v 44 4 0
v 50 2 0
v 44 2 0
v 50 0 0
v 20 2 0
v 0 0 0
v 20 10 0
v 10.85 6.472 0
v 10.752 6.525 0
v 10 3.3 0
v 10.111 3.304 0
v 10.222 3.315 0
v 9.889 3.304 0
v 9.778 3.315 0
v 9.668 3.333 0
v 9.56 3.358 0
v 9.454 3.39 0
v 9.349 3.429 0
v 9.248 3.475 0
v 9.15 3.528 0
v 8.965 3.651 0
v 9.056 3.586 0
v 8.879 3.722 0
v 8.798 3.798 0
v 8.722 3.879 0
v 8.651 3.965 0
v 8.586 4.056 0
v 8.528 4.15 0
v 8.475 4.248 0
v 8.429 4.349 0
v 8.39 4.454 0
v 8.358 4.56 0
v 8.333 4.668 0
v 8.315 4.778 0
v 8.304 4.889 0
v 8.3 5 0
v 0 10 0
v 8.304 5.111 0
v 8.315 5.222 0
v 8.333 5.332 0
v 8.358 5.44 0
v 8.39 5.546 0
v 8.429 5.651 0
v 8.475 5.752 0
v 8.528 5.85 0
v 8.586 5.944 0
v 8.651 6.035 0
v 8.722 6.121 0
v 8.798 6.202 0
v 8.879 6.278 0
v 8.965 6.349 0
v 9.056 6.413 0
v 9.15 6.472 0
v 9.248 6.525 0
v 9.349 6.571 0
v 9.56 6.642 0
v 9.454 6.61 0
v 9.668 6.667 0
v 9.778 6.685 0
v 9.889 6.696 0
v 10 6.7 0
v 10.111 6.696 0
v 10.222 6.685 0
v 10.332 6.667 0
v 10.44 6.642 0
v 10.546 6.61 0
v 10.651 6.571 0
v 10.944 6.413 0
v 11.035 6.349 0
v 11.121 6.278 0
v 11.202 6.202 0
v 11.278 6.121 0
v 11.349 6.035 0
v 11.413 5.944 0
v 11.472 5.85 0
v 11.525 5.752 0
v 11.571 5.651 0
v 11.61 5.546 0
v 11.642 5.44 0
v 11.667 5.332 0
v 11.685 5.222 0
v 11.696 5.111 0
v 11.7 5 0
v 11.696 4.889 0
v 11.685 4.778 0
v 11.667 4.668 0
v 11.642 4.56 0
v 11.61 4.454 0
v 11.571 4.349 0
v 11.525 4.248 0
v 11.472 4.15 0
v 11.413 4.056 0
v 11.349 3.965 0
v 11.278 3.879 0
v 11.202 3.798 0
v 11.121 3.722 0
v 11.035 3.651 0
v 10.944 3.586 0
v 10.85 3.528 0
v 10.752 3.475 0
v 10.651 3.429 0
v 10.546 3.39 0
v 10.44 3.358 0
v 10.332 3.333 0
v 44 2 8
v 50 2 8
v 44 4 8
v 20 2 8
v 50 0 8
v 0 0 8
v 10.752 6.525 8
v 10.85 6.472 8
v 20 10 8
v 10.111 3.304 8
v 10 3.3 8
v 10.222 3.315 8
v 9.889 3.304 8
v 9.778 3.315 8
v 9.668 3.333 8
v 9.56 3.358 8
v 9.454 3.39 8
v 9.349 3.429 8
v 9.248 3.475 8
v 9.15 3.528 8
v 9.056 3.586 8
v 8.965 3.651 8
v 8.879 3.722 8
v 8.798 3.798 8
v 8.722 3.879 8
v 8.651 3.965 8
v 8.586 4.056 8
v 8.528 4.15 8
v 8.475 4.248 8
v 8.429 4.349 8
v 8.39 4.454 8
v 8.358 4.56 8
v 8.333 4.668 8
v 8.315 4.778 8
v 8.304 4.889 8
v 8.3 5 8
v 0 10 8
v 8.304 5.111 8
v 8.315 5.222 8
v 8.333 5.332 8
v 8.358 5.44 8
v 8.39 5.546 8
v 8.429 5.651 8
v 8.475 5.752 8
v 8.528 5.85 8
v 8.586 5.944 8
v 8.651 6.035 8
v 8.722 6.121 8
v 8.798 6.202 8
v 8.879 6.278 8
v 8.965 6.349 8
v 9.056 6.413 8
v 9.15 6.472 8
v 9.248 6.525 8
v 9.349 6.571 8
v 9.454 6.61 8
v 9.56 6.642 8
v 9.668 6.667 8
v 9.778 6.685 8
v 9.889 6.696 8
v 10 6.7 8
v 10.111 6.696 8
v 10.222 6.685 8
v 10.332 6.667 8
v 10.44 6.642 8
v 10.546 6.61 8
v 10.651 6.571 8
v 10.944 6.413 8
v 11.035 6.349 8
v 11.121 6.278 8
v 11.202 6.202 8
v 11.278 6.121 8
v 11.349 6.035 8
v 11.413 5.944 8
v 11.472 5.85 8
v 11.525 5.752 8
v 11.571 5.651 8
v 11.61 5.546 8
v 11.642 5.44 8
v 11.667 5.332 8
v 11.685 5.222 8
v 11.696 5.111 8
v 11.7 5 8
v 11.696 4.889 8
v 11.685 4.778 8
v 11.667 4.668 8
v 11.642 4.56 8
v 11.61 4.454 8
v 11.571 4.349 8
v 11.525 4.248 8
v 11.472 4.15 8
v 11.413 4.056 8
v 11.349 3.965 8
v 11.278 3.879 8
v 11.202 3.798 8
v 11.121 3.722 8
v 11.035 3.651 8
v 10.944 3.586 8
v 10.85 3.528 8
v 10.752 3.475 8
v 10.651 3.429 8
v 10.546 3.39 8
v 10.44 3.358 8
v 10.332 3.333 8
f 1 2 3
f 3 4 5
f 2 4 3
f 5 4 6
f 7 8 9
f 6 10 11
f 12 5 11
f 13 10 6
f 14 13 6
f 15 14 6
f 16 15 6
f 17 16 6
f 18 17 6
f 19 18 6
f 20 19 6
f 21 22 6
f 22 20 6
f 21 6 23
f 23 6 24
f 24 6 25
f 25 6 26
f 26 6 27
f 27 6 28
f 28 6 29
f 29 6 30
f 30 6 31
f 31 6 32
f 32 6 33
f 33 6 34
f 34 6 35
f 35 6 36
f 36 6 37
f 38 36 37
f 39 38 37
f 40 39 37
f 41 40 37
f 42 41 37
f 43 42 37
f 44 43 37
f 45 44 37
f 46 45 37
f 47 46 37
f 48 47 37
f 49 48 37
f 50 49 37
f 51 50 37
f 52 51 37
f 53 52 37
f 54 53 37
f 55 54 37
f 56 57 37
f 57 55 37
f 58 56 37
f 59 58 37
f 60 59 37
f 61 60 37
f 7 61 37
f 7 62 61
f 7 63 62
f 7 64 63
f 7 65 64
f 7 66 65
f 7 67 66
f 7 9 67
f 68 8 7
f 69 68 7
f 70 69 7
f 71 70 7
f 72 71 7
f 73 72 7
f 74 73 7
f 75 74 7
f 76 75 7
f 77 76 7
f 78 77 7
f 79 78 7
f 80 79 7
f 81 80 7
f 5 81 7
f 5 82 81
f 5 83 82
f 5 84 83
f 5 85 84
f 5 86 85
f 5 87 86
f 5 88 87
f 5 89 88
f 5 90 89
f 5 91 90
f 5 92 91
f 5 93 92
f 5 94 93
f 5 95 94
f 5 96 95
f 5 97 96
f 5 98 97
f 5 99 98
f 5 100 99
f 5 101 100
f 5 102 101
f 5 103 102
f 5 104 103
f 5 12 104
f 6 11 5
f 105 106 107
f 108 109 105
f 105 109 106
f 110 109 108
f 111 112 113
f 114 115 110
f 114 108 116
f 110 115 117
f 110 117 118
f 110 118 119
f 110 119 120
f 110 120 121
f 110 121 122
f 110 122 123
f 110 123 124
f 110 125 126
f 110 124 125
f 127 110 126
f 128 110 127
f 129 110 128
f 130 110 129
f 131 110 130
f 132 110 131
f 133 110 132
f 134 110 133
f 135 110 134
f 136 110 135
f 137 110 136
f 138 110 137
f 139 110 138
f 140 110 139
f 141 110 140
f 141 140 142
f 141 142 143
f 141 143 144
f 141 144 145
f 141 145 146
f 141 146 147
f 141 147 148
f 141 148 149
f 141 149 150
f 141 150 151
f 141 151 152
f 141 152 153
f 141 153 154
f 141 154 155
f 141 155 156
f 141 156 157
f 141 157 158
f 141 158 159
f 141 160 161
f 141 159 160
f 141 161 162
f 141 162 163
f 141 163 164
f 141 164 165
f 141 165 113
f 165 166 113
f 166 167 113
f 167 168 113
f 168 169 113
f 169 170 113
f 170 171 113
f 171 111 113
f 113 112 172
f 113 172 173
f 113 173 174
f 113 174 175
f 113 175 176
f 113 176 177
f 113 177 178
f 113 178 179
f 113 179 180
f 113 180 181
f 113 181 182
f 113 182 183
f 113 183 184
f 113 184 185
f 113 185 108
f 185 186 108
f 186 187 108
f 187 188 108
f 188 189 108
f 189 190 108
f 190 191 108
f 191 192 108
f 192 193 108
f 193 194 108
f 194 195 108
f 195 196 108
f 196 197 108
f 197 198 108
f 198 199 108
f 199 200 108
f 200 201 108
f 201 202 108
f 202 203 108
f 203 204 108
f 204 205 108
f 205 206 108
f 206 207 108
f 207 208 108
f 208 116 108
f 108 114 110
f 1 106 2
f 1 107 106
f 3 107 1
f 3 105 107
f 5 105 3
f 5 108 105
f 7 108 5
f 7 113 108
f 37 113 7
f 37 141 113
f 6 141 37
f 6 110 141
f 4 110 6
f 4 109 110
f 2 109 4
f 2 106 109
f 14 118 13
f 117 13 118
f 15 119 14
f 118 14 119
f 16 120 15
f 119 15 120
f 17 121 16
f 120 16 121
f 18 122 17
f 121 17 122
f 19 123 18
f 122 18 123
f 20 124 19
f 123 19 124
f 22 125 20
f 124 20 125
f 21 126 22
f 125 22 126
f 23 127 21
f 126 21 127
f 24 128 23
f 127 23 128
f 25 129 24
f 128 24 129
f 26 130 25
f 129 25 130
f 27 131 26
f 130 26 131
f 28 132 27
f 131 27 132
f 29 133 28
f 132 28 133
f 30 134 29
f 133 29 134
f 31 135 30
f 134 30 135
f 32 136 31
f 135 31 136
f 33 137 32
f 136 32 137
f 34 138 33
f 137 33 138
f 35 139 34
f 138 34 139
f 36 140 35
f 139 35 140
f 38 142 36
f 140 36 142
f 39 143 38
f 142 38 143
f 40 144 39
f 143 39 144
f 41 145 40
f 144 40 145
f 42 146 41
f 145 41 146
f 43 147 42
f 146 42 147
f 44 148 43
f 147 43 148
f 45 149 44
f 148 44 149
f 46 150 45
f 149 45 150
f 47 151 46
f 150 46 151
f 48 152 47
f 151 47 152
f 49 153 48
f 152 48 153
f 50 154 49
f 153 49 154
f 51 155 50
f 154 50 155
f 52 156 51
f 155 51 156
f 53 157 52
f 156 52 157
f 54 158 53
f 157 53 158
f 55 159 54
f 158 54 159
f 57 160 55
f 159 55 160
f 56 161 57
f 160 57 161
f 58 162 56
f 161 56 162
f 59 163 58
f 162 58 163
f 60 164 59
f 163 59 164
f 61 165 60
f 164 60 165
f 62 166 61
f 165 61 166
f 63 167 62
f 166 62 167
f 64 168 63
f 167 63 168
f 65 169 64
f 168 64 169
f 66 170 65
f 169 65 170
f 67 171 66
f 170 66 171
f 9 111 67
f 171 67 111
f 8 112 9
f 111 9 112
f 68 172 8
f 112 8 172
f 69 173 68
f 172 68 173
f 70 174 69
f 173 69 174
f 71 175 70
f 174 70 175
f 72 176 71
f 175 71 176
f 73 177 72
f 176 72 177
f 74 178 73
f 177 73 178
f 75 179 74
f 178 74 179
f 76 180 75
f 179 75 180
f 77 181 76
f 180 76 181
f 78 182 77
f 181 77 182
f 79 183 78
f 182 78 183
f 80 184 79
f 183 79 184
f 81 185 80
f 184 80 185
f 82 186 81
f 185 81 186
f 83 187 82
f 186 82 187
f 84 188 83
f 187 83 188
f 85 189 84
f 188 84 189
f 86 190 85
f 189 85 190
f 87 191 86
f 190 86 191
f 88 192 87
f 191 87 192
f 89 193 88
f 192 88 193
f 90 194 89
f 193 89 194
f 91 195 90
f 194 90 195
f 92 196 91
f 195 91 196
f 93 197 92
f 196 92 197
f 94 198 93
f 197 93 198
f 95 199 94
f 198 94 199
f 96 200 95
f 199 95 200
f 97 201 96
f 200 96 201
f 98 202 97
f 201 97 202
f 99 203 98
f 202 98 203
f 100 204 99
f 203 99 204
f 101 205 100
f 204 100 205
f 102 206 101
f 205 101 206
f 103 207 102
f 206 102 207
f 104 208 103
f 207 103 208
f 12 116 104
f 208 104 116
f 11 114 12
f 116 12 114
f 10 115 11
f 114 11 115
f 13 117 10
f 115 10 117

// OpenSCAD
// Snap clip laid flat: the 8 mm width is vertical, so the beam bends along
// its layers instead of across them.
$fn = 96;
beam_length = 30; beam_thickness = 2; barb_height = 2;
linear_extrude(8) difference() {
    union() {
        square([20, 10]);
        translate([20, 0]) square([beam_length, beam_thickness]);
        polygon([[20 + beam_length - 6, beam_thickness], [20 + beam_length - 6, beam_thickness + barb_height],
                 [20 + beam_length, beam_thickness]]);
    }
    translate([10, 5]) circle(d = 3.4);
}
